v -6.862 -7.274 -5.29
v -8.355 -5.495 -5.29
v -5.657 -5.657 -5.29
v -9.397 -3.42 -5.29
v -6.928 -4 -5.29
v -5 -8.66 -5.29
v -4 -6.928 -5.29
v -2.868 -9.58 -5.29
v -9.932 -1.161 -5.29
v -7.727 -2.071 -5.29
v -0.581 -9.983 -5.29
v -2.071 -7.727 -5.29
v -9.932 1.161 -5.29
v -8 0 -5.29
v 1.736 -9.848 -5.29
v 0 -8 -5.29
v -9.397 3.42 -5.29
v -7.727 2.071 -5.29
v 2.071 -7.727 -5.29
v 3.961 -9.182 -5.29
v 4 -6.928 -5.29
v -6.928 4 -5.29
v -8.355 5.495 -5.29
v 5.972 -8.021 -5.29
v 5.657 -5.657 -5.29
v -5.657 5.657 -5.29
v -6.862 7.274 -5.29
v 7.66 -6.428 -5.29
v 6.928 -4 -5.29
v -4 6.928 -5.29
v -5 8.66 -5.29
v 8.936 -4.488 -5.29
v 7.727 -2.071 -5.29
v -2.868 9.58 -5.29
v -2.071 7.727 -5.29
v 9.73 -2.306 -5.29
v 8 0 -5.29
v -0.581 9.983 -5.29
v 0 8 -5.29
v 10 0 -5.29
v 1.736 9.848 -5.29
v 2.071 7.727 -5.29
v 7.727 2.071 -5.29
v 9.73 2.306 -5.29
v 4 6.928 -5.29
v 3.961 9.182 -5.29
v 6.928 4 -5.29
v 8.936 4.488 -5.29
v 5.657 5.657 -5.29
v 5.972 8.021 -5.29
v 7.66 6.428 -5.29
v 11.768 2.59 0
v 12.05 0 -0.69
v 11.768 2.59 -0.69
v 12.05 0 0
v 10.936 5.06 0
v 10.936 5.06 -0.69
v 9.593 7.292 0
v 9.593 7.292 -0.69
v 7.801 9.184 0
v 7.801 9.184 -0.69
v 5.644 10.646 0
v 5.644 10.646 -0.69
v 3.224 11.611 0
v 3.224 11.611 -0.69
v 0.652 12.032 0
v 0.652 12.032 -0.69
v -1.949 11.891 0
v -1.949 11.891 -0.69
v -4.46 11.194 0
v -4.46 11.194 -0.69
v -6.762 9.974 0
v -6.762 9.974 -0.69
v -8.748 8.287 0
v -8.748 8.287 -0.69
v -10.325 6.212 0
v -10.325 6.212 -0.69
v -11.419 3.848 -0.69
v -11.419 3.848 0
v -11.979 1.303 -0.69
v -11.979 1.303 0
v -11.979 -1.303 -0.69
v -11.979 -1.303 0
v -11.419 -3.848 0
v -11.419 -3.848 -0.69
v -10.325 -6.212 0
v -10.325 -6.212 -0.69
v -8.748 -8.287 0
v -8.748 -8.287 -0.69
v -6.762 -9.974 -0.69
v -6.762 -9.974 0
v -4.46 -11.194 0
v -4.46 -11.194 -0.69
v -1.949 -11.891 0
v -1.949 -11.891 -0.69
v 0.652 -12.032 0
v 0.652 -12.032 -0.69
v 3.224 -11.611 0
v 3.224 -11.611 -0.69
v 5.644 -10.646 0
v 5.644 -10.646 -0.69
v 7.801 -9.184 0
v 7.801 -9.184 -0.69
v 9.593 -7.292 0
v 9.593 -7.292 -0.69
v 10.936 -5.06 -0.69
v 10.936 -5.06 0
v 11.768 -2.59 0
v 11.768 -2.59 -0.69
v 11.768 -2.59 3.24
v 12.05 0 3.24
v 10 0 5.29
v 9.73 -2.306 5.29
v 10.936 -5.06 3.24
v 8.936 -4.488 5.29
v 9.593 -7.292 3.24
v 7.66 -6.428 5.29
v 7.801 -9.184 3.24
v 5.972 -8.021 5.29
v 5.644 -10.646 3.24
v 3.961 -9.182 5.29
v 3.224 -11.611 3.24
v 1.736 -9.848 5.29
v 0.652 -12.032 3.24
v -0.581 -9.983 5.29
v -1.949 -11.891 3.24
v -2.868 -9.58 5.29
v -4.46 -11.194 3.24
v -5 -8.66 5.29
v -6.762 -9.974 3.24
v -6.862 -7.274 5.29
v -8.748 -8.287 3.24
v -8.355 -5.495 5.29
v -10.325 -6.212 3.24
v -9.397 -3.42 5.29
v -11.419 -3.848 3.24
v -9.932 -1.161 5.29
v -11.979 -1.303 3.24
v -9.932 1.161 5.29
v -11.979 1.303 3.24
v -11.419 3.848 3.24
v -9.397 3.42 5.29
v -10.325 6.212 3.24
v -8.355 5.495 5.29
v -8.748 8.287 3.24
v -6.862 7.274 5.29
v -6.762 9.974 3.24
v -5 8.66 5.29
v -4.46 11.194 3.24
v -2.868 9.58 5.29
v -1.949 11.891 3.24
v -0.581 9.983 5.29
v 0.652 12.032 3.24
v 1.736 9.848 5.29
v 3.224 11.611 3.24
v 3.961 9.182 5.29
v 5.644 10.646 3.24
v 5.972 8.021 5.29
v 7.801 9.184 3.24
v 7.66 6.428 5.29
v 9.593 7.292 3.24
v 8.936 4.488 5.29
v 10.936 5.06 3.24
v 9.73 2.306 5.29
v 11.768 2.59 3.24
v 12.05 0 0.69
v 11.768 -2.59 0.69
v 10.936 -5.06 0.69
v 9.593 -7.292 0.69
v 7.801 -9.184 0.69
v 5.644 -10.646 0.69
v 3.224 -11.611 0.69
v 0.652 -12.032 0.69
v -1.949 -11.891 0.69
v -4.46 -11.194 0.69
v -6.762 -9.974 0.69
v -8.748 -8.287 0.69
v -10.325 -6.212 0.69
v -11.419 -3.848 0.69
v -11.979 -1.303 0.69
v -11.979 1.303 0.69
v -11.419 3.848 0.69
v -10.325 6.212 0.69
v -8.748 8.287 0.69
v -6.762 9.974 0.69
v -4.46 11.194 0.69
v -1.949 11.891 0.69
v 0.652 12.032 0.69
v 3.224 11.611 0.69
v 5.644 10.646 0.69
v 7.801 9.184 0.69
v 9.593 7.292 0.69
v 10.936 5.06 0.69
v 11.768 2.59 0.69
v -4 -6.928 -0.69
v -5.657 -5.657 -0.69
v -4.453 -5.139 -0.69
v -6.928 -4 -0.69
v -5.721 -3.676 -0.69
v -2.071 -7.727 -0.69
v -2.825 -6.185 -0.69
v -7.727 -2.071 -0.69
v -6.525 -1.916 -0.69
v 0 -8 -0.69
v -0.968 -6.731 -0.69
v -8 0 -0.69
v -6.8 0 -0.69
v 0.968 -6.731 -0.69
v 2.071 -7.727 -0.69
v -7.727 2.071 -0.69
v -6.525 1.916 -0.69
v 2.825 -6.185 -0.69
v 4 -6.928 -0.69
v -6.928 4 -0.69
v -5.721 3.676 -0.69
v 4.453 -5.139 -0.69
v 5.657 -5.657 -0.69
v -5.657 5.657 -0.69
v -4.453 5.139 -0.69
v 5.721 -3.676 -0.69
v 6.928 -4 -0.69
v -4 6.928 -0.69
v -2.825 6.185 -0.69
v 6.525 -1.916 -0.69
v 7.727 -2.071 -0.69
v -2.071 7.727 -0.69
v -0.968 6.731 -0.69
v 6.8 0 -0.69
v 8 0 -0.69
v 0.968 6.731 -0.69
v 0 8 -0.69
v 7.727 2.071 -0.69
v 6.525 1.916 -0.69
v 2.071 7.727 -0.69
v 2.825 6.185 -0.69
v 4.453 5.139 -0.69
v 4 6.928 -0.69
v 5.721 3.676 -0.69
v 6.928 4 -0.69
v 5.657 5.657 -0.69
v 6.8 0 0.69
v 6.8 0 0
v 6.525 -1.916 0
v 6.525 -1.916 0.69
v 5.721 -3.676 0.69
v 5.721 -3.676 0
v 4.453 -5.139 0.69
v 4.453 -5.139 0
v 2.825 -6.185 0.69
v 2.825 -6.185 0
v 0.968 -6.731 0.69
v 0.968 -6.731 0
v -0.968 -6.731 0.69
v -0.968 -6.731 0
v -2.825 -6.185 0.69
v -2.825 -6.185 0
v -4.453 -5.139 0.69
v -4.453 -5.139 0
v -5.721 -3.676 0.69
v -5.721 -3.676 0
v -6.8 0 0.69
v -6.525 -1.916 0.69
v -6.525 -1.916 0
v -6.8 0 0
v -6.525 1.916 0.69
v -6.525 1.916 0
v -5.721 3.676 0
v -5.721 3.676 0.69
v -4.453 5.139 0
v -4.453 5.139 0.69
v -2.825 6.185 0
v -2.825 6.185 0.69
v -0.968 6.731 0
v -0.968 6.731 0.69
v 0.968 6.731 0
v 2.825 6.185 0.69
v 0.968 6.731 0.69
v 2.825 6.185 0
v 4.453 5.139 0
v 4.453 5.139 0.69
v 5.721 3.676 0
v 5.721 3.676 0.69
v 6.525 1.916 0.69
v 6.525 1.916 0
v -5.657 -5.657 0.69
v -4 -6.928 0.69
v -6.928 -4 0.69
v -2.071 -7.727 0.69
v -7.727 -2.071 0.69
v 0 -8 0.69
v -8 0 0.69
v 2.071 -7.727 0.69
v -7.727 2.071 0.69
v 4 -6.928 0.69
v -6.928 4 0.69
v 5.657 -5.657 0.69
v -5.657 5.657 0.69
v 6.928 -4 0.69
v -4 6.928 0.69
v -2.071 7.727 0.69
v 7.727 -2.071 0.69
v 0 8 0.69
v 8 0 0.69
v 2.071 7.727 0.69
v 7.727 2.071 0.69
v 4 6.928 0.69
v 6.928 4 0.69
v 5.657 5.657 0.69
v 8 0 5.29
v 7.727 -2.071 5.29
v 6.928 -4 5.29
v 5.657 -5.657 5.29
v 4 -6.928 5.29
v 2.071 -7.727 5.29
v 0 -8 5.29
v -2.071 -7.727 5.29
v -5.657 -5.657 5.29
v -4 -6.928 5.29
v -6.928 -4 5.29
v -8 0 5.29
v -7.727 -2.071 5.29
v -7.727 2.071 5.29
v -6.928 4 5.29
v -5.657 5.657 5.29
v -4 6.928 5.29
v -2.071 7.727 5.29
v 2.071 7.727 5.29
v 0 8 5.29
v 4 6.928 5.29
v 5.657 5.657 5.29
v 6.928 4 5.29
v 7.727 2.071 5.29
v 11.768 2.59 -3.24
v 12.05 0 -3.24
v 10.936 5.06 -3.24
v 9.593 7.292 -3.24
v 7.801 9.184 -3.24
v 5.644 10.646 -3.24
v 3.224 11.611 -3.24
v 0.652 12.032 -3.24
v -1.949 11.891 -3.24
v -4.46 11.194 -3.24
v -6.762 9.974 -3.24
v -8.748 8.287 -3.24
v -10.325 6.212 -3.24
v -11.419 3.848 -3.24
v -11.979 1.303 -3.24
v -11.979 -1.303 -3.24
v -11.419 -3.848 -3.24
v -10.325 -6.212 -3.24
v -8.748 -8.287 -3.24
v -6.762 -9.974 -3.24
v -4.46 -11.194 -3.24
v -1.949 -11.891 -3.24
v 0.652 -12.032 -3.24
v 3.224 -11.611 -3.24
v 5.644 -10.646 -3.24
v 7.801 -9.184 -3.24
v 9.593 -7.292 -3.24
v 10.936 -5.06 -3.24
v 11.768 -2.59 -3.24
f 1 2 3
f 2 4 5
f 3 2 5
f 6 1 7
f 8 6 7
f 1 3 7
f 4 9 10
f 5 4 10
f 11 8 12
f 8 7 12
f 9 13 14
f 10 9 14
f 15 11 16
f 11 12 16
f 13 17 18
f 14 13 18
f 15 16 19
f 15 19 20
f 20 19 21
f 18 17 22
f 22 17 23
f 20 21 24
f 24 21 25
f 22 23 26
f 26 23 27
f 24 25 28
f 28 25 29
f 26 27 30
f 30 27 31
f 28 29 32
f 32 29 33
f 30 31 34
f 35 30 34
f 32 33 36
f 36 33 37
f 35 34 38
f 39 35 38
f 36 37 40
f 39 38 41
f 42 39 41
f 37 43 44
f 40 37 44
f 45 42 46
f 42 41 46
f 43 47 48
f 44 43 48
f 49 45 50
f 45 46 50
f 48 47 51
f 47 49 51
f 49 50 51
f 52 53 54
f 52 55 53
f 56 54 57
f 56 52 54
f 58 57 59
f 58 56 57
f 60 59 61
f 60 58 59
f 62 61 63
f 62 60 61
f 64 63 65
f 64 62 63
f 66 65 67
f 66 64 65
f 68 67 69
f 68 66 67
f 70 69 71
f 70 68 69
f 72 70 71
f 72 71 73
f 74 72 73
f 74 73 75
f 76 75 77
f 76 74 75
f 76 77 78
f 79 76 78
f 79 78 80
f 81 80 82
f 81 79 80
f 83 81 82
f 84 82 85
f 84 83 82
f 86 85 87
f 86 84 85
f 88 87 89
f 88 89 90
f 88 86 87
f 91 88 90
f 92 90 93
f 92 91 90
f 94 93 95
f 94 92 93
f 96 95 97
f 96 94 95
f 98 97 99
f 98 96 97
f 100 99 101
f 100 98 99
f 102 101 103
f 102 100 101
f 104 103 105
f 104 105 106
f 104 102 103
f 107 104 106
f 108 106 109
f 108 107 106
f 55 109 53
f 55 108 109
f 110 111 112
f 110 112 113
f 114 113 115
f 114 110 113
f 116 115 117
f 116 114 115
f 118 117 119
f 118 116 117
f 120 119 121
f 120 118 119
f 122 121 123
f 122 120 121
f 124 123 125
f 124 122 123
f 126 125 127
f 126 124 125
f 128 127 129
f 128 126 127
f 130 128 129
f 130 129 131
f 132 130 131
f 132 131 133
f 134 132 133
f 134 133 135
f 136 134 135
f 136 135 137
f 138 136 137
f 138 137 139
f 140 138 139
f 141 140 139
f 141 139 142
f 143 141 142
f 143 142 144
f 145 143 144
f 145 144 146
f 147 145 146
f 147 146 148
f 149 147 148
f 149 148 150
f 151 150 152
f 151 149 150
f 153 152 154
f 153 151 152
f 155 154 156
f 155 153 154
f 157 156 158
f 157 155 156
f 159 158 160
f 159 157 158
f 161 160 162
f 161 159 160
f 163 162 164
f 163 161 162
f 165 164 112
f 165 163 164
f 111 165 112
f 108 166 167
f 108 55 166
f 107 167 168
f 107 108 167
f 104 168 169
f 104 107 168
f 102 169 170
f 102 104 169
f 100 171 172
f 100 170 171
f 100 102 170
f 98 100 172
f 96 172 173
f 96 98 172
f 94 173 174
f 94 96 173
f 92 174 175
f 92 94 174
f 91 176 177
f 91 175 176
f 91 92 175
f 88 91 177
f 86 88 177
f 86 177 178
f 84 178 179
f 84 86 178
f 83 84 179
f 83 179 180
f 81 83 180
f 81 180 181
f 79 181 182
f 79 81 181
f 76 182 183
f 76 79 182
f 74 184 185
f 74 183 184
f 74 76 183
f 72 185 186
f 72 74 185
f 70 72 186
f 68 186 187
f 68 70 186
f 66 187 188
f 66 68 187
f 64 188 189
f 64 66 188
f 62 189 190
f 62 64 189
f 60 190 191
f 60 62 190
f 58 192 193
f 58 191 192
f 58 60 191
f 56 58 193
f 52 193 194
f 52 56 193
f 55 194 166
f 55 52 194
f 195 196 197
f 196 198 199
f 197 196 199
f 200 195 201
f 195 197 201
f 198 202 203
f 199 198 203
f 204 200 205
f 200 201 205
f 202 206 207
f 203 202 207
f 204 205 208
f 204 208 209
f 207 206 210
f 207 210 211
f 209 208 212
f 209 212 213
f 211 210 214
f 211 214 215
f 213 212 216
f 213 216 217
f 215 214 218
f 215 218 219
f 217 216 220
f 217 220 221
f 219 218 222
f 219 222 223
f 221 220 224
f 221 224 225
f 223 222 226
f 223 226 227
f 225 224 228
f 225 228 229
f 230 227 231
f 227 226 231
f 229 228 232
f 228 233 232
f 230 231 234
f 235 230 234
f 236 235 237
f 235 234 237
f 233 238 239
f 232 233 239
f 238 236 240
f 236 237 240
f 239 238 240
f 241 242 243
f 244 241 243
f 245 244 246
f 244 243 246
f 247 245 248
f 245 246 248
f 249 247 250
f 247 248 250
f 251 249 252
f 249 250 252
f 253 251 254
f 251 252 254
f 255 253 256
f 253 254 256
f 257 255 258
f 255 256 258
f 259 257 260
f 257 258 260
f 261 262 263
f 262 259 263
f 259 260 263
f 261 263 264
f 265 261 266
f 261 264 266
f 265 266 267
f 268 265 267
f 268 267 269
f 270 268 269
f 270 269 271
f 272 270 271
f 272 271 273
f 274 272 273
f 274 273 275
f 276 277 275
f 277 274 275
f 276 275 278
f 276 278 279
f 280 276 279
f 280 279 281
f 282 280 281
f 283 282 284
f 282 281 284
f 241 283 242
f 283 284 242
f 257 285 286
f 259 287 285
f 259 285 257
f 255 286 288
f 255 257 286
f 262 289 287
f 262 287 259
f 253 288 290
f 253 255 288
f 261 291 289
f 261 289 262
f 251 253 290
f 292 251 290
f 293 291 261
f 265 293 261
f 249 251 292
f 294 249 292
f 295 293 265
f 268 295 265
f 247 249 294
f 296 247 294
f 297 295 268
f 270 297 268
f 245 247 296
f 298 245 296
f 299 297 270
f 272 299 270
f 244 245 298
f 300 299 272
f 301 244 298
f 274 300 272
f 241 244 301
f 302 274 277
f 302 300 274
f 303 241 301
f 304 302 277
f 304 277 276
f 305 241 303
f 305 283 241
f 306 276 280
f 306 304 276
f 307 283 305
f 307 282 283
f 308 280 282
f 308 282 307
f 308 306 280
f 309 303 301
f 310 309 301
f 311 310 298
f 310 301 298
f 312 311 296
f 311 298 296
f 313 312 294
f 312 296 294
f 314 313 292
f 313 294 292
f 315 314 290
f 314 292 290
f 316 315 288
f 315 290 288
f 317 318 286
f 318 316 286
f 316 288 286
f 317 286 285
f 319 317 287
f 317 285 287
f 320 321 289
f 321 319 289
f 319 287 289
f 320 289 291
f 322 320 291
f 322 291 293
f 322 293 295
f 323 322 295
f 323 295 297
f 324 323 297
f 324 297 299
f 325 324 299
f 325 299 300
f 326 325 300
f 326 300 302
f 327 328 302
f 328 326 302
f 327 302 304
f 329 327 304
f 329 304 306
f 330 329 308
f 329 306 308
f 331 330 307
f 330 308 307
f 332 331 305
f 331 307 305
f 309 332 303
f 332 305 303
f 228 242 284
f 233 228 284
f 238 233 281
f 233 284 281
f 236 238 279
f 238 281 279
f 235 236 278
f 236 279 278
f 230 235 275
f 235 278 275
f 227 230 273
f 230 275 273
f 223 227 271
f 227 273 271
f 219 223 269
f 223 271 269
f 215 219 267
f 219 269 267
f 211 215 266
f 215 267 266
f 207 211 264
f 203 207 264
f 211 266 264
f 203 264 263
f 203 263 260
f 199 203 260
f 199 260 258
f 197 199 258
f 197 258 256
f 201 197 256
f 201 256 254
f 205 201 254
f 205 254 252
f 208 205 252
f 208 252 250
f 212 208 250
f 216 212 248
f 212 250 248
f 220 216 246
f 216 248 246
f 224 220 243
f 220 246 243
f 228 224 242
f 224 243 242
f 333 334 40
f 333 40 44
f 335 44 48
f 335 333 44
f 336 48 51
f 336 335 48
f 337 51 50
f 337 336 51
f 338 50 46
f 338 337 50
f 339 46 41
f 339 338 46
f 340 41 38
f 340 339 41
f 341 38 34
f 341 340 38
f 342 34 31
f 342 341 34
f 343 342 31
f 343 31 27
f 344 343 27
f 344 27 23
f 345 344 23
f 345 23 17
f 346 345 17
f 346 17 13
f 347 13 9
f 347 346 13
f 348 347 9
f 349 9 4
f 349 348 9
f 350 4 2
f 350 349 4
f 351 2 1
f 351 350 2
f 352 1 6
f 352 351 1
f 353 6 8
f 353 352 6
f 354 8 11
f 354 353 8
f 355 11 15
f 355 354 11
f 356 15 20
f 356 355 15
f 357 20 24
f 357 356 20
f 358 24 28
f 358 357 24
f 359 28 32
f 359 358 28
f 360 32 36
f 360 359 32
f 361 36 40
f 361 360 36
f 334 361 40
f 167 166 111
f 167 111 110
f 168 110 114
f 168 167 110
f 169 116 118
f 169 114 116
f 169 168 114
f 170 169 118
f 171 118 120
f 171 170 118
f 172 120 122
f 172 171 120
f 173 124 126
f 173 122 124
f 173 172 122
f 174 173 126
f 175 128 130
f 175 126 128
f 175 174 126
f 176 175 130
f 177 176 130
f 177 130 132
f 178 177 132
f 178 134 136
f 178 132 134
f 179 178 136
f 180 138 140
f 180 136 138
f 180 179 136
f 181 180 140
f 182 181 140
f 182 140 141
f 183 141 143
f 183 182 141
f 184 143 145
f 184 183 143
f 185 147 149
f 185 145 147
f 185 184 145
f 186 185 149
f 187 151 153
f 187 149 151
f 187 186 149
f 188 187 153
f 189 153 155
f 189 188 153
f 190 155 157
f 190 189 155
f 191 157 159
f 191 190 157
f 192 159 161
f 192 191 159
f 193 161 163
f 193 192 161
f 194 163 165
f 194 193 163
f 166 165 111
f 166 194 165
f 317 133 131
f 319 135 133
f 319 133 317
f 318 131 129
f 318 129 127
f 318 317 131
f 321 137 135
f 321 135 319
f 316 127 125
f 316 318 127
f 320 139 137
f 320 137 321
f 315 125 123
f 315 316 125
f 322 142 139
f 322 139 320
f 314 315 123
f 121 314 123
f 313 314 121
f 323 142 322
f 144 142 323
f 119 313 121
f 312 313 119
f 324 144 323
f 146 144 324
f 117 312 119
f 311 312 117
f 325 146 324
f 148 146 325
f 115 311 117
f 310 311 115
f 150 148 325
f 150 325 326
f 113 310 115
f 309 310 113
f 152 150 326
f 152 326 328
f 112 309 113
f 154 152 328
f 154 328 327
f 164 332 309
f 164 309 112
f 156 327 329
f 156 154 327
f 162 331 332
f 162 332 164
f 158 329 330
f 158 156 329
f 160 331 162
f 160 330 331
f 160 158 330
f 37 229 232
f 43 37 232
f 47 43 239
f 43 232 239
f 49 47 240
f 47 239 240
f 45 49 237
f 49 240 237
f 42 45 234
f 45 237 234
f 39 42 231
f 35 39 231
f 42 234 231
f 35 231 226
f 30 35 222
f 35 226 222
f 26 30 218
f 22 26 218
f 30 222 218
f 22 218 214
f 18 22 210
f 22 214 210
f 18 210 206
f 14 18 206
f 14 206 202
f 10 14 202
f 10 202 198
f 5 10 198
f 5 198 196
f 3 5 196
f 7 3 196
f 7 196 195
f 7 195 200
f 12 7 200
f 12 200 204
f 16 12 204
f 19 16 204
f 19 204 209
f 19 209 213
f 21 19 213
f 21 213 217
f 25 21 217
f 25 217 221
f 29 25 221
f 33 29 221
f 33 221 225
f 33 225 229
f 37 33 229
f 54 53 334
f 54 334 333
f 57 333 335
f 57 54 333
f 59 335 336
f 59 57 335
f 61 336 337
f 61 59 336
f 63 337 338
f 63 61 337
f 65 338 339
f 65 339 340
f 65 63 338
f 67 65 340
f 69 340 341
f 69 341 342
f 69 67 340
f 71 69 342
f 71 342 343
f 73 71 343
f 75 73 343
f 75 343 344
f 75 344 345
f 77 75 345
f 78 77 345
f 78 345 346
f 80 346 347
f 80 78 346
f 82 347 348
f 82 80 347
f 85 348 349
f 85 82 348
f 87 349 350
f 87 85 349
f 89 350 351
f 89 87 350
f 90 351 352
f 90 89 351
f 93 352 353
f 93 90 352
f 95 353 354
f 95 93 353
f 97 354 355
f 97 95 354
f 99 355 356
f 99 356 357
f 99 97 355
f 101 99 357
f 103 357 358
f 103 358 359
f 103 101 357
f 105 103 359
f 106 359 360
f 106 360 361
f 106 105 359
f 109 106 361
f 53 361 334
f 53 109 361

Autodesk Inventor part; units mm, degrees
ref_plane "YZ Plane" through (0, 0, 0) normal (1, 0, 0) x (0, 1, 0)
ref_plane "XZ Plane" through (0, 0, 0) normal (0, 1, 0) x (-1, 0, 0)
ref_plane "XY Plane" through (0, 0, 0) normal (0, 0, 1) x (1, 0, 0)
sketch "Sketch1" plane through (0, 0, 0) normal (0, 0, 1) x (1, 0, 0)
  circle A0 centre (0, 0) radius 6.8
  circle A1 centre (0, 0) radius 12.05
  dimension "d10" = 13.6
  dimension "d11" = 24.1
extrude "Extrusion3" add sketch "Sketch1" along normal mid plane 1.38
sketch "Sketch2" plane through (0, 0, 0) normal (0, 0, 1) x (1, 0, 0)
  circle A0 centre (0, 0) radius 12.05
  circle A1 centre (0, 0) radius 8
  dimension "d14" = 24.1
  dimension "d15" = 16
extrude "Extrusion4" add sketch "Sketch2" along normal mid plane 10.58
chamfer "Chamfer2" distance 2.05 angle 45 2 edges at (-12.05, 0, 5.29) (-12.05, 0, -5.29)
properties part number "Rollers" material "Acetal Resin, Black"
